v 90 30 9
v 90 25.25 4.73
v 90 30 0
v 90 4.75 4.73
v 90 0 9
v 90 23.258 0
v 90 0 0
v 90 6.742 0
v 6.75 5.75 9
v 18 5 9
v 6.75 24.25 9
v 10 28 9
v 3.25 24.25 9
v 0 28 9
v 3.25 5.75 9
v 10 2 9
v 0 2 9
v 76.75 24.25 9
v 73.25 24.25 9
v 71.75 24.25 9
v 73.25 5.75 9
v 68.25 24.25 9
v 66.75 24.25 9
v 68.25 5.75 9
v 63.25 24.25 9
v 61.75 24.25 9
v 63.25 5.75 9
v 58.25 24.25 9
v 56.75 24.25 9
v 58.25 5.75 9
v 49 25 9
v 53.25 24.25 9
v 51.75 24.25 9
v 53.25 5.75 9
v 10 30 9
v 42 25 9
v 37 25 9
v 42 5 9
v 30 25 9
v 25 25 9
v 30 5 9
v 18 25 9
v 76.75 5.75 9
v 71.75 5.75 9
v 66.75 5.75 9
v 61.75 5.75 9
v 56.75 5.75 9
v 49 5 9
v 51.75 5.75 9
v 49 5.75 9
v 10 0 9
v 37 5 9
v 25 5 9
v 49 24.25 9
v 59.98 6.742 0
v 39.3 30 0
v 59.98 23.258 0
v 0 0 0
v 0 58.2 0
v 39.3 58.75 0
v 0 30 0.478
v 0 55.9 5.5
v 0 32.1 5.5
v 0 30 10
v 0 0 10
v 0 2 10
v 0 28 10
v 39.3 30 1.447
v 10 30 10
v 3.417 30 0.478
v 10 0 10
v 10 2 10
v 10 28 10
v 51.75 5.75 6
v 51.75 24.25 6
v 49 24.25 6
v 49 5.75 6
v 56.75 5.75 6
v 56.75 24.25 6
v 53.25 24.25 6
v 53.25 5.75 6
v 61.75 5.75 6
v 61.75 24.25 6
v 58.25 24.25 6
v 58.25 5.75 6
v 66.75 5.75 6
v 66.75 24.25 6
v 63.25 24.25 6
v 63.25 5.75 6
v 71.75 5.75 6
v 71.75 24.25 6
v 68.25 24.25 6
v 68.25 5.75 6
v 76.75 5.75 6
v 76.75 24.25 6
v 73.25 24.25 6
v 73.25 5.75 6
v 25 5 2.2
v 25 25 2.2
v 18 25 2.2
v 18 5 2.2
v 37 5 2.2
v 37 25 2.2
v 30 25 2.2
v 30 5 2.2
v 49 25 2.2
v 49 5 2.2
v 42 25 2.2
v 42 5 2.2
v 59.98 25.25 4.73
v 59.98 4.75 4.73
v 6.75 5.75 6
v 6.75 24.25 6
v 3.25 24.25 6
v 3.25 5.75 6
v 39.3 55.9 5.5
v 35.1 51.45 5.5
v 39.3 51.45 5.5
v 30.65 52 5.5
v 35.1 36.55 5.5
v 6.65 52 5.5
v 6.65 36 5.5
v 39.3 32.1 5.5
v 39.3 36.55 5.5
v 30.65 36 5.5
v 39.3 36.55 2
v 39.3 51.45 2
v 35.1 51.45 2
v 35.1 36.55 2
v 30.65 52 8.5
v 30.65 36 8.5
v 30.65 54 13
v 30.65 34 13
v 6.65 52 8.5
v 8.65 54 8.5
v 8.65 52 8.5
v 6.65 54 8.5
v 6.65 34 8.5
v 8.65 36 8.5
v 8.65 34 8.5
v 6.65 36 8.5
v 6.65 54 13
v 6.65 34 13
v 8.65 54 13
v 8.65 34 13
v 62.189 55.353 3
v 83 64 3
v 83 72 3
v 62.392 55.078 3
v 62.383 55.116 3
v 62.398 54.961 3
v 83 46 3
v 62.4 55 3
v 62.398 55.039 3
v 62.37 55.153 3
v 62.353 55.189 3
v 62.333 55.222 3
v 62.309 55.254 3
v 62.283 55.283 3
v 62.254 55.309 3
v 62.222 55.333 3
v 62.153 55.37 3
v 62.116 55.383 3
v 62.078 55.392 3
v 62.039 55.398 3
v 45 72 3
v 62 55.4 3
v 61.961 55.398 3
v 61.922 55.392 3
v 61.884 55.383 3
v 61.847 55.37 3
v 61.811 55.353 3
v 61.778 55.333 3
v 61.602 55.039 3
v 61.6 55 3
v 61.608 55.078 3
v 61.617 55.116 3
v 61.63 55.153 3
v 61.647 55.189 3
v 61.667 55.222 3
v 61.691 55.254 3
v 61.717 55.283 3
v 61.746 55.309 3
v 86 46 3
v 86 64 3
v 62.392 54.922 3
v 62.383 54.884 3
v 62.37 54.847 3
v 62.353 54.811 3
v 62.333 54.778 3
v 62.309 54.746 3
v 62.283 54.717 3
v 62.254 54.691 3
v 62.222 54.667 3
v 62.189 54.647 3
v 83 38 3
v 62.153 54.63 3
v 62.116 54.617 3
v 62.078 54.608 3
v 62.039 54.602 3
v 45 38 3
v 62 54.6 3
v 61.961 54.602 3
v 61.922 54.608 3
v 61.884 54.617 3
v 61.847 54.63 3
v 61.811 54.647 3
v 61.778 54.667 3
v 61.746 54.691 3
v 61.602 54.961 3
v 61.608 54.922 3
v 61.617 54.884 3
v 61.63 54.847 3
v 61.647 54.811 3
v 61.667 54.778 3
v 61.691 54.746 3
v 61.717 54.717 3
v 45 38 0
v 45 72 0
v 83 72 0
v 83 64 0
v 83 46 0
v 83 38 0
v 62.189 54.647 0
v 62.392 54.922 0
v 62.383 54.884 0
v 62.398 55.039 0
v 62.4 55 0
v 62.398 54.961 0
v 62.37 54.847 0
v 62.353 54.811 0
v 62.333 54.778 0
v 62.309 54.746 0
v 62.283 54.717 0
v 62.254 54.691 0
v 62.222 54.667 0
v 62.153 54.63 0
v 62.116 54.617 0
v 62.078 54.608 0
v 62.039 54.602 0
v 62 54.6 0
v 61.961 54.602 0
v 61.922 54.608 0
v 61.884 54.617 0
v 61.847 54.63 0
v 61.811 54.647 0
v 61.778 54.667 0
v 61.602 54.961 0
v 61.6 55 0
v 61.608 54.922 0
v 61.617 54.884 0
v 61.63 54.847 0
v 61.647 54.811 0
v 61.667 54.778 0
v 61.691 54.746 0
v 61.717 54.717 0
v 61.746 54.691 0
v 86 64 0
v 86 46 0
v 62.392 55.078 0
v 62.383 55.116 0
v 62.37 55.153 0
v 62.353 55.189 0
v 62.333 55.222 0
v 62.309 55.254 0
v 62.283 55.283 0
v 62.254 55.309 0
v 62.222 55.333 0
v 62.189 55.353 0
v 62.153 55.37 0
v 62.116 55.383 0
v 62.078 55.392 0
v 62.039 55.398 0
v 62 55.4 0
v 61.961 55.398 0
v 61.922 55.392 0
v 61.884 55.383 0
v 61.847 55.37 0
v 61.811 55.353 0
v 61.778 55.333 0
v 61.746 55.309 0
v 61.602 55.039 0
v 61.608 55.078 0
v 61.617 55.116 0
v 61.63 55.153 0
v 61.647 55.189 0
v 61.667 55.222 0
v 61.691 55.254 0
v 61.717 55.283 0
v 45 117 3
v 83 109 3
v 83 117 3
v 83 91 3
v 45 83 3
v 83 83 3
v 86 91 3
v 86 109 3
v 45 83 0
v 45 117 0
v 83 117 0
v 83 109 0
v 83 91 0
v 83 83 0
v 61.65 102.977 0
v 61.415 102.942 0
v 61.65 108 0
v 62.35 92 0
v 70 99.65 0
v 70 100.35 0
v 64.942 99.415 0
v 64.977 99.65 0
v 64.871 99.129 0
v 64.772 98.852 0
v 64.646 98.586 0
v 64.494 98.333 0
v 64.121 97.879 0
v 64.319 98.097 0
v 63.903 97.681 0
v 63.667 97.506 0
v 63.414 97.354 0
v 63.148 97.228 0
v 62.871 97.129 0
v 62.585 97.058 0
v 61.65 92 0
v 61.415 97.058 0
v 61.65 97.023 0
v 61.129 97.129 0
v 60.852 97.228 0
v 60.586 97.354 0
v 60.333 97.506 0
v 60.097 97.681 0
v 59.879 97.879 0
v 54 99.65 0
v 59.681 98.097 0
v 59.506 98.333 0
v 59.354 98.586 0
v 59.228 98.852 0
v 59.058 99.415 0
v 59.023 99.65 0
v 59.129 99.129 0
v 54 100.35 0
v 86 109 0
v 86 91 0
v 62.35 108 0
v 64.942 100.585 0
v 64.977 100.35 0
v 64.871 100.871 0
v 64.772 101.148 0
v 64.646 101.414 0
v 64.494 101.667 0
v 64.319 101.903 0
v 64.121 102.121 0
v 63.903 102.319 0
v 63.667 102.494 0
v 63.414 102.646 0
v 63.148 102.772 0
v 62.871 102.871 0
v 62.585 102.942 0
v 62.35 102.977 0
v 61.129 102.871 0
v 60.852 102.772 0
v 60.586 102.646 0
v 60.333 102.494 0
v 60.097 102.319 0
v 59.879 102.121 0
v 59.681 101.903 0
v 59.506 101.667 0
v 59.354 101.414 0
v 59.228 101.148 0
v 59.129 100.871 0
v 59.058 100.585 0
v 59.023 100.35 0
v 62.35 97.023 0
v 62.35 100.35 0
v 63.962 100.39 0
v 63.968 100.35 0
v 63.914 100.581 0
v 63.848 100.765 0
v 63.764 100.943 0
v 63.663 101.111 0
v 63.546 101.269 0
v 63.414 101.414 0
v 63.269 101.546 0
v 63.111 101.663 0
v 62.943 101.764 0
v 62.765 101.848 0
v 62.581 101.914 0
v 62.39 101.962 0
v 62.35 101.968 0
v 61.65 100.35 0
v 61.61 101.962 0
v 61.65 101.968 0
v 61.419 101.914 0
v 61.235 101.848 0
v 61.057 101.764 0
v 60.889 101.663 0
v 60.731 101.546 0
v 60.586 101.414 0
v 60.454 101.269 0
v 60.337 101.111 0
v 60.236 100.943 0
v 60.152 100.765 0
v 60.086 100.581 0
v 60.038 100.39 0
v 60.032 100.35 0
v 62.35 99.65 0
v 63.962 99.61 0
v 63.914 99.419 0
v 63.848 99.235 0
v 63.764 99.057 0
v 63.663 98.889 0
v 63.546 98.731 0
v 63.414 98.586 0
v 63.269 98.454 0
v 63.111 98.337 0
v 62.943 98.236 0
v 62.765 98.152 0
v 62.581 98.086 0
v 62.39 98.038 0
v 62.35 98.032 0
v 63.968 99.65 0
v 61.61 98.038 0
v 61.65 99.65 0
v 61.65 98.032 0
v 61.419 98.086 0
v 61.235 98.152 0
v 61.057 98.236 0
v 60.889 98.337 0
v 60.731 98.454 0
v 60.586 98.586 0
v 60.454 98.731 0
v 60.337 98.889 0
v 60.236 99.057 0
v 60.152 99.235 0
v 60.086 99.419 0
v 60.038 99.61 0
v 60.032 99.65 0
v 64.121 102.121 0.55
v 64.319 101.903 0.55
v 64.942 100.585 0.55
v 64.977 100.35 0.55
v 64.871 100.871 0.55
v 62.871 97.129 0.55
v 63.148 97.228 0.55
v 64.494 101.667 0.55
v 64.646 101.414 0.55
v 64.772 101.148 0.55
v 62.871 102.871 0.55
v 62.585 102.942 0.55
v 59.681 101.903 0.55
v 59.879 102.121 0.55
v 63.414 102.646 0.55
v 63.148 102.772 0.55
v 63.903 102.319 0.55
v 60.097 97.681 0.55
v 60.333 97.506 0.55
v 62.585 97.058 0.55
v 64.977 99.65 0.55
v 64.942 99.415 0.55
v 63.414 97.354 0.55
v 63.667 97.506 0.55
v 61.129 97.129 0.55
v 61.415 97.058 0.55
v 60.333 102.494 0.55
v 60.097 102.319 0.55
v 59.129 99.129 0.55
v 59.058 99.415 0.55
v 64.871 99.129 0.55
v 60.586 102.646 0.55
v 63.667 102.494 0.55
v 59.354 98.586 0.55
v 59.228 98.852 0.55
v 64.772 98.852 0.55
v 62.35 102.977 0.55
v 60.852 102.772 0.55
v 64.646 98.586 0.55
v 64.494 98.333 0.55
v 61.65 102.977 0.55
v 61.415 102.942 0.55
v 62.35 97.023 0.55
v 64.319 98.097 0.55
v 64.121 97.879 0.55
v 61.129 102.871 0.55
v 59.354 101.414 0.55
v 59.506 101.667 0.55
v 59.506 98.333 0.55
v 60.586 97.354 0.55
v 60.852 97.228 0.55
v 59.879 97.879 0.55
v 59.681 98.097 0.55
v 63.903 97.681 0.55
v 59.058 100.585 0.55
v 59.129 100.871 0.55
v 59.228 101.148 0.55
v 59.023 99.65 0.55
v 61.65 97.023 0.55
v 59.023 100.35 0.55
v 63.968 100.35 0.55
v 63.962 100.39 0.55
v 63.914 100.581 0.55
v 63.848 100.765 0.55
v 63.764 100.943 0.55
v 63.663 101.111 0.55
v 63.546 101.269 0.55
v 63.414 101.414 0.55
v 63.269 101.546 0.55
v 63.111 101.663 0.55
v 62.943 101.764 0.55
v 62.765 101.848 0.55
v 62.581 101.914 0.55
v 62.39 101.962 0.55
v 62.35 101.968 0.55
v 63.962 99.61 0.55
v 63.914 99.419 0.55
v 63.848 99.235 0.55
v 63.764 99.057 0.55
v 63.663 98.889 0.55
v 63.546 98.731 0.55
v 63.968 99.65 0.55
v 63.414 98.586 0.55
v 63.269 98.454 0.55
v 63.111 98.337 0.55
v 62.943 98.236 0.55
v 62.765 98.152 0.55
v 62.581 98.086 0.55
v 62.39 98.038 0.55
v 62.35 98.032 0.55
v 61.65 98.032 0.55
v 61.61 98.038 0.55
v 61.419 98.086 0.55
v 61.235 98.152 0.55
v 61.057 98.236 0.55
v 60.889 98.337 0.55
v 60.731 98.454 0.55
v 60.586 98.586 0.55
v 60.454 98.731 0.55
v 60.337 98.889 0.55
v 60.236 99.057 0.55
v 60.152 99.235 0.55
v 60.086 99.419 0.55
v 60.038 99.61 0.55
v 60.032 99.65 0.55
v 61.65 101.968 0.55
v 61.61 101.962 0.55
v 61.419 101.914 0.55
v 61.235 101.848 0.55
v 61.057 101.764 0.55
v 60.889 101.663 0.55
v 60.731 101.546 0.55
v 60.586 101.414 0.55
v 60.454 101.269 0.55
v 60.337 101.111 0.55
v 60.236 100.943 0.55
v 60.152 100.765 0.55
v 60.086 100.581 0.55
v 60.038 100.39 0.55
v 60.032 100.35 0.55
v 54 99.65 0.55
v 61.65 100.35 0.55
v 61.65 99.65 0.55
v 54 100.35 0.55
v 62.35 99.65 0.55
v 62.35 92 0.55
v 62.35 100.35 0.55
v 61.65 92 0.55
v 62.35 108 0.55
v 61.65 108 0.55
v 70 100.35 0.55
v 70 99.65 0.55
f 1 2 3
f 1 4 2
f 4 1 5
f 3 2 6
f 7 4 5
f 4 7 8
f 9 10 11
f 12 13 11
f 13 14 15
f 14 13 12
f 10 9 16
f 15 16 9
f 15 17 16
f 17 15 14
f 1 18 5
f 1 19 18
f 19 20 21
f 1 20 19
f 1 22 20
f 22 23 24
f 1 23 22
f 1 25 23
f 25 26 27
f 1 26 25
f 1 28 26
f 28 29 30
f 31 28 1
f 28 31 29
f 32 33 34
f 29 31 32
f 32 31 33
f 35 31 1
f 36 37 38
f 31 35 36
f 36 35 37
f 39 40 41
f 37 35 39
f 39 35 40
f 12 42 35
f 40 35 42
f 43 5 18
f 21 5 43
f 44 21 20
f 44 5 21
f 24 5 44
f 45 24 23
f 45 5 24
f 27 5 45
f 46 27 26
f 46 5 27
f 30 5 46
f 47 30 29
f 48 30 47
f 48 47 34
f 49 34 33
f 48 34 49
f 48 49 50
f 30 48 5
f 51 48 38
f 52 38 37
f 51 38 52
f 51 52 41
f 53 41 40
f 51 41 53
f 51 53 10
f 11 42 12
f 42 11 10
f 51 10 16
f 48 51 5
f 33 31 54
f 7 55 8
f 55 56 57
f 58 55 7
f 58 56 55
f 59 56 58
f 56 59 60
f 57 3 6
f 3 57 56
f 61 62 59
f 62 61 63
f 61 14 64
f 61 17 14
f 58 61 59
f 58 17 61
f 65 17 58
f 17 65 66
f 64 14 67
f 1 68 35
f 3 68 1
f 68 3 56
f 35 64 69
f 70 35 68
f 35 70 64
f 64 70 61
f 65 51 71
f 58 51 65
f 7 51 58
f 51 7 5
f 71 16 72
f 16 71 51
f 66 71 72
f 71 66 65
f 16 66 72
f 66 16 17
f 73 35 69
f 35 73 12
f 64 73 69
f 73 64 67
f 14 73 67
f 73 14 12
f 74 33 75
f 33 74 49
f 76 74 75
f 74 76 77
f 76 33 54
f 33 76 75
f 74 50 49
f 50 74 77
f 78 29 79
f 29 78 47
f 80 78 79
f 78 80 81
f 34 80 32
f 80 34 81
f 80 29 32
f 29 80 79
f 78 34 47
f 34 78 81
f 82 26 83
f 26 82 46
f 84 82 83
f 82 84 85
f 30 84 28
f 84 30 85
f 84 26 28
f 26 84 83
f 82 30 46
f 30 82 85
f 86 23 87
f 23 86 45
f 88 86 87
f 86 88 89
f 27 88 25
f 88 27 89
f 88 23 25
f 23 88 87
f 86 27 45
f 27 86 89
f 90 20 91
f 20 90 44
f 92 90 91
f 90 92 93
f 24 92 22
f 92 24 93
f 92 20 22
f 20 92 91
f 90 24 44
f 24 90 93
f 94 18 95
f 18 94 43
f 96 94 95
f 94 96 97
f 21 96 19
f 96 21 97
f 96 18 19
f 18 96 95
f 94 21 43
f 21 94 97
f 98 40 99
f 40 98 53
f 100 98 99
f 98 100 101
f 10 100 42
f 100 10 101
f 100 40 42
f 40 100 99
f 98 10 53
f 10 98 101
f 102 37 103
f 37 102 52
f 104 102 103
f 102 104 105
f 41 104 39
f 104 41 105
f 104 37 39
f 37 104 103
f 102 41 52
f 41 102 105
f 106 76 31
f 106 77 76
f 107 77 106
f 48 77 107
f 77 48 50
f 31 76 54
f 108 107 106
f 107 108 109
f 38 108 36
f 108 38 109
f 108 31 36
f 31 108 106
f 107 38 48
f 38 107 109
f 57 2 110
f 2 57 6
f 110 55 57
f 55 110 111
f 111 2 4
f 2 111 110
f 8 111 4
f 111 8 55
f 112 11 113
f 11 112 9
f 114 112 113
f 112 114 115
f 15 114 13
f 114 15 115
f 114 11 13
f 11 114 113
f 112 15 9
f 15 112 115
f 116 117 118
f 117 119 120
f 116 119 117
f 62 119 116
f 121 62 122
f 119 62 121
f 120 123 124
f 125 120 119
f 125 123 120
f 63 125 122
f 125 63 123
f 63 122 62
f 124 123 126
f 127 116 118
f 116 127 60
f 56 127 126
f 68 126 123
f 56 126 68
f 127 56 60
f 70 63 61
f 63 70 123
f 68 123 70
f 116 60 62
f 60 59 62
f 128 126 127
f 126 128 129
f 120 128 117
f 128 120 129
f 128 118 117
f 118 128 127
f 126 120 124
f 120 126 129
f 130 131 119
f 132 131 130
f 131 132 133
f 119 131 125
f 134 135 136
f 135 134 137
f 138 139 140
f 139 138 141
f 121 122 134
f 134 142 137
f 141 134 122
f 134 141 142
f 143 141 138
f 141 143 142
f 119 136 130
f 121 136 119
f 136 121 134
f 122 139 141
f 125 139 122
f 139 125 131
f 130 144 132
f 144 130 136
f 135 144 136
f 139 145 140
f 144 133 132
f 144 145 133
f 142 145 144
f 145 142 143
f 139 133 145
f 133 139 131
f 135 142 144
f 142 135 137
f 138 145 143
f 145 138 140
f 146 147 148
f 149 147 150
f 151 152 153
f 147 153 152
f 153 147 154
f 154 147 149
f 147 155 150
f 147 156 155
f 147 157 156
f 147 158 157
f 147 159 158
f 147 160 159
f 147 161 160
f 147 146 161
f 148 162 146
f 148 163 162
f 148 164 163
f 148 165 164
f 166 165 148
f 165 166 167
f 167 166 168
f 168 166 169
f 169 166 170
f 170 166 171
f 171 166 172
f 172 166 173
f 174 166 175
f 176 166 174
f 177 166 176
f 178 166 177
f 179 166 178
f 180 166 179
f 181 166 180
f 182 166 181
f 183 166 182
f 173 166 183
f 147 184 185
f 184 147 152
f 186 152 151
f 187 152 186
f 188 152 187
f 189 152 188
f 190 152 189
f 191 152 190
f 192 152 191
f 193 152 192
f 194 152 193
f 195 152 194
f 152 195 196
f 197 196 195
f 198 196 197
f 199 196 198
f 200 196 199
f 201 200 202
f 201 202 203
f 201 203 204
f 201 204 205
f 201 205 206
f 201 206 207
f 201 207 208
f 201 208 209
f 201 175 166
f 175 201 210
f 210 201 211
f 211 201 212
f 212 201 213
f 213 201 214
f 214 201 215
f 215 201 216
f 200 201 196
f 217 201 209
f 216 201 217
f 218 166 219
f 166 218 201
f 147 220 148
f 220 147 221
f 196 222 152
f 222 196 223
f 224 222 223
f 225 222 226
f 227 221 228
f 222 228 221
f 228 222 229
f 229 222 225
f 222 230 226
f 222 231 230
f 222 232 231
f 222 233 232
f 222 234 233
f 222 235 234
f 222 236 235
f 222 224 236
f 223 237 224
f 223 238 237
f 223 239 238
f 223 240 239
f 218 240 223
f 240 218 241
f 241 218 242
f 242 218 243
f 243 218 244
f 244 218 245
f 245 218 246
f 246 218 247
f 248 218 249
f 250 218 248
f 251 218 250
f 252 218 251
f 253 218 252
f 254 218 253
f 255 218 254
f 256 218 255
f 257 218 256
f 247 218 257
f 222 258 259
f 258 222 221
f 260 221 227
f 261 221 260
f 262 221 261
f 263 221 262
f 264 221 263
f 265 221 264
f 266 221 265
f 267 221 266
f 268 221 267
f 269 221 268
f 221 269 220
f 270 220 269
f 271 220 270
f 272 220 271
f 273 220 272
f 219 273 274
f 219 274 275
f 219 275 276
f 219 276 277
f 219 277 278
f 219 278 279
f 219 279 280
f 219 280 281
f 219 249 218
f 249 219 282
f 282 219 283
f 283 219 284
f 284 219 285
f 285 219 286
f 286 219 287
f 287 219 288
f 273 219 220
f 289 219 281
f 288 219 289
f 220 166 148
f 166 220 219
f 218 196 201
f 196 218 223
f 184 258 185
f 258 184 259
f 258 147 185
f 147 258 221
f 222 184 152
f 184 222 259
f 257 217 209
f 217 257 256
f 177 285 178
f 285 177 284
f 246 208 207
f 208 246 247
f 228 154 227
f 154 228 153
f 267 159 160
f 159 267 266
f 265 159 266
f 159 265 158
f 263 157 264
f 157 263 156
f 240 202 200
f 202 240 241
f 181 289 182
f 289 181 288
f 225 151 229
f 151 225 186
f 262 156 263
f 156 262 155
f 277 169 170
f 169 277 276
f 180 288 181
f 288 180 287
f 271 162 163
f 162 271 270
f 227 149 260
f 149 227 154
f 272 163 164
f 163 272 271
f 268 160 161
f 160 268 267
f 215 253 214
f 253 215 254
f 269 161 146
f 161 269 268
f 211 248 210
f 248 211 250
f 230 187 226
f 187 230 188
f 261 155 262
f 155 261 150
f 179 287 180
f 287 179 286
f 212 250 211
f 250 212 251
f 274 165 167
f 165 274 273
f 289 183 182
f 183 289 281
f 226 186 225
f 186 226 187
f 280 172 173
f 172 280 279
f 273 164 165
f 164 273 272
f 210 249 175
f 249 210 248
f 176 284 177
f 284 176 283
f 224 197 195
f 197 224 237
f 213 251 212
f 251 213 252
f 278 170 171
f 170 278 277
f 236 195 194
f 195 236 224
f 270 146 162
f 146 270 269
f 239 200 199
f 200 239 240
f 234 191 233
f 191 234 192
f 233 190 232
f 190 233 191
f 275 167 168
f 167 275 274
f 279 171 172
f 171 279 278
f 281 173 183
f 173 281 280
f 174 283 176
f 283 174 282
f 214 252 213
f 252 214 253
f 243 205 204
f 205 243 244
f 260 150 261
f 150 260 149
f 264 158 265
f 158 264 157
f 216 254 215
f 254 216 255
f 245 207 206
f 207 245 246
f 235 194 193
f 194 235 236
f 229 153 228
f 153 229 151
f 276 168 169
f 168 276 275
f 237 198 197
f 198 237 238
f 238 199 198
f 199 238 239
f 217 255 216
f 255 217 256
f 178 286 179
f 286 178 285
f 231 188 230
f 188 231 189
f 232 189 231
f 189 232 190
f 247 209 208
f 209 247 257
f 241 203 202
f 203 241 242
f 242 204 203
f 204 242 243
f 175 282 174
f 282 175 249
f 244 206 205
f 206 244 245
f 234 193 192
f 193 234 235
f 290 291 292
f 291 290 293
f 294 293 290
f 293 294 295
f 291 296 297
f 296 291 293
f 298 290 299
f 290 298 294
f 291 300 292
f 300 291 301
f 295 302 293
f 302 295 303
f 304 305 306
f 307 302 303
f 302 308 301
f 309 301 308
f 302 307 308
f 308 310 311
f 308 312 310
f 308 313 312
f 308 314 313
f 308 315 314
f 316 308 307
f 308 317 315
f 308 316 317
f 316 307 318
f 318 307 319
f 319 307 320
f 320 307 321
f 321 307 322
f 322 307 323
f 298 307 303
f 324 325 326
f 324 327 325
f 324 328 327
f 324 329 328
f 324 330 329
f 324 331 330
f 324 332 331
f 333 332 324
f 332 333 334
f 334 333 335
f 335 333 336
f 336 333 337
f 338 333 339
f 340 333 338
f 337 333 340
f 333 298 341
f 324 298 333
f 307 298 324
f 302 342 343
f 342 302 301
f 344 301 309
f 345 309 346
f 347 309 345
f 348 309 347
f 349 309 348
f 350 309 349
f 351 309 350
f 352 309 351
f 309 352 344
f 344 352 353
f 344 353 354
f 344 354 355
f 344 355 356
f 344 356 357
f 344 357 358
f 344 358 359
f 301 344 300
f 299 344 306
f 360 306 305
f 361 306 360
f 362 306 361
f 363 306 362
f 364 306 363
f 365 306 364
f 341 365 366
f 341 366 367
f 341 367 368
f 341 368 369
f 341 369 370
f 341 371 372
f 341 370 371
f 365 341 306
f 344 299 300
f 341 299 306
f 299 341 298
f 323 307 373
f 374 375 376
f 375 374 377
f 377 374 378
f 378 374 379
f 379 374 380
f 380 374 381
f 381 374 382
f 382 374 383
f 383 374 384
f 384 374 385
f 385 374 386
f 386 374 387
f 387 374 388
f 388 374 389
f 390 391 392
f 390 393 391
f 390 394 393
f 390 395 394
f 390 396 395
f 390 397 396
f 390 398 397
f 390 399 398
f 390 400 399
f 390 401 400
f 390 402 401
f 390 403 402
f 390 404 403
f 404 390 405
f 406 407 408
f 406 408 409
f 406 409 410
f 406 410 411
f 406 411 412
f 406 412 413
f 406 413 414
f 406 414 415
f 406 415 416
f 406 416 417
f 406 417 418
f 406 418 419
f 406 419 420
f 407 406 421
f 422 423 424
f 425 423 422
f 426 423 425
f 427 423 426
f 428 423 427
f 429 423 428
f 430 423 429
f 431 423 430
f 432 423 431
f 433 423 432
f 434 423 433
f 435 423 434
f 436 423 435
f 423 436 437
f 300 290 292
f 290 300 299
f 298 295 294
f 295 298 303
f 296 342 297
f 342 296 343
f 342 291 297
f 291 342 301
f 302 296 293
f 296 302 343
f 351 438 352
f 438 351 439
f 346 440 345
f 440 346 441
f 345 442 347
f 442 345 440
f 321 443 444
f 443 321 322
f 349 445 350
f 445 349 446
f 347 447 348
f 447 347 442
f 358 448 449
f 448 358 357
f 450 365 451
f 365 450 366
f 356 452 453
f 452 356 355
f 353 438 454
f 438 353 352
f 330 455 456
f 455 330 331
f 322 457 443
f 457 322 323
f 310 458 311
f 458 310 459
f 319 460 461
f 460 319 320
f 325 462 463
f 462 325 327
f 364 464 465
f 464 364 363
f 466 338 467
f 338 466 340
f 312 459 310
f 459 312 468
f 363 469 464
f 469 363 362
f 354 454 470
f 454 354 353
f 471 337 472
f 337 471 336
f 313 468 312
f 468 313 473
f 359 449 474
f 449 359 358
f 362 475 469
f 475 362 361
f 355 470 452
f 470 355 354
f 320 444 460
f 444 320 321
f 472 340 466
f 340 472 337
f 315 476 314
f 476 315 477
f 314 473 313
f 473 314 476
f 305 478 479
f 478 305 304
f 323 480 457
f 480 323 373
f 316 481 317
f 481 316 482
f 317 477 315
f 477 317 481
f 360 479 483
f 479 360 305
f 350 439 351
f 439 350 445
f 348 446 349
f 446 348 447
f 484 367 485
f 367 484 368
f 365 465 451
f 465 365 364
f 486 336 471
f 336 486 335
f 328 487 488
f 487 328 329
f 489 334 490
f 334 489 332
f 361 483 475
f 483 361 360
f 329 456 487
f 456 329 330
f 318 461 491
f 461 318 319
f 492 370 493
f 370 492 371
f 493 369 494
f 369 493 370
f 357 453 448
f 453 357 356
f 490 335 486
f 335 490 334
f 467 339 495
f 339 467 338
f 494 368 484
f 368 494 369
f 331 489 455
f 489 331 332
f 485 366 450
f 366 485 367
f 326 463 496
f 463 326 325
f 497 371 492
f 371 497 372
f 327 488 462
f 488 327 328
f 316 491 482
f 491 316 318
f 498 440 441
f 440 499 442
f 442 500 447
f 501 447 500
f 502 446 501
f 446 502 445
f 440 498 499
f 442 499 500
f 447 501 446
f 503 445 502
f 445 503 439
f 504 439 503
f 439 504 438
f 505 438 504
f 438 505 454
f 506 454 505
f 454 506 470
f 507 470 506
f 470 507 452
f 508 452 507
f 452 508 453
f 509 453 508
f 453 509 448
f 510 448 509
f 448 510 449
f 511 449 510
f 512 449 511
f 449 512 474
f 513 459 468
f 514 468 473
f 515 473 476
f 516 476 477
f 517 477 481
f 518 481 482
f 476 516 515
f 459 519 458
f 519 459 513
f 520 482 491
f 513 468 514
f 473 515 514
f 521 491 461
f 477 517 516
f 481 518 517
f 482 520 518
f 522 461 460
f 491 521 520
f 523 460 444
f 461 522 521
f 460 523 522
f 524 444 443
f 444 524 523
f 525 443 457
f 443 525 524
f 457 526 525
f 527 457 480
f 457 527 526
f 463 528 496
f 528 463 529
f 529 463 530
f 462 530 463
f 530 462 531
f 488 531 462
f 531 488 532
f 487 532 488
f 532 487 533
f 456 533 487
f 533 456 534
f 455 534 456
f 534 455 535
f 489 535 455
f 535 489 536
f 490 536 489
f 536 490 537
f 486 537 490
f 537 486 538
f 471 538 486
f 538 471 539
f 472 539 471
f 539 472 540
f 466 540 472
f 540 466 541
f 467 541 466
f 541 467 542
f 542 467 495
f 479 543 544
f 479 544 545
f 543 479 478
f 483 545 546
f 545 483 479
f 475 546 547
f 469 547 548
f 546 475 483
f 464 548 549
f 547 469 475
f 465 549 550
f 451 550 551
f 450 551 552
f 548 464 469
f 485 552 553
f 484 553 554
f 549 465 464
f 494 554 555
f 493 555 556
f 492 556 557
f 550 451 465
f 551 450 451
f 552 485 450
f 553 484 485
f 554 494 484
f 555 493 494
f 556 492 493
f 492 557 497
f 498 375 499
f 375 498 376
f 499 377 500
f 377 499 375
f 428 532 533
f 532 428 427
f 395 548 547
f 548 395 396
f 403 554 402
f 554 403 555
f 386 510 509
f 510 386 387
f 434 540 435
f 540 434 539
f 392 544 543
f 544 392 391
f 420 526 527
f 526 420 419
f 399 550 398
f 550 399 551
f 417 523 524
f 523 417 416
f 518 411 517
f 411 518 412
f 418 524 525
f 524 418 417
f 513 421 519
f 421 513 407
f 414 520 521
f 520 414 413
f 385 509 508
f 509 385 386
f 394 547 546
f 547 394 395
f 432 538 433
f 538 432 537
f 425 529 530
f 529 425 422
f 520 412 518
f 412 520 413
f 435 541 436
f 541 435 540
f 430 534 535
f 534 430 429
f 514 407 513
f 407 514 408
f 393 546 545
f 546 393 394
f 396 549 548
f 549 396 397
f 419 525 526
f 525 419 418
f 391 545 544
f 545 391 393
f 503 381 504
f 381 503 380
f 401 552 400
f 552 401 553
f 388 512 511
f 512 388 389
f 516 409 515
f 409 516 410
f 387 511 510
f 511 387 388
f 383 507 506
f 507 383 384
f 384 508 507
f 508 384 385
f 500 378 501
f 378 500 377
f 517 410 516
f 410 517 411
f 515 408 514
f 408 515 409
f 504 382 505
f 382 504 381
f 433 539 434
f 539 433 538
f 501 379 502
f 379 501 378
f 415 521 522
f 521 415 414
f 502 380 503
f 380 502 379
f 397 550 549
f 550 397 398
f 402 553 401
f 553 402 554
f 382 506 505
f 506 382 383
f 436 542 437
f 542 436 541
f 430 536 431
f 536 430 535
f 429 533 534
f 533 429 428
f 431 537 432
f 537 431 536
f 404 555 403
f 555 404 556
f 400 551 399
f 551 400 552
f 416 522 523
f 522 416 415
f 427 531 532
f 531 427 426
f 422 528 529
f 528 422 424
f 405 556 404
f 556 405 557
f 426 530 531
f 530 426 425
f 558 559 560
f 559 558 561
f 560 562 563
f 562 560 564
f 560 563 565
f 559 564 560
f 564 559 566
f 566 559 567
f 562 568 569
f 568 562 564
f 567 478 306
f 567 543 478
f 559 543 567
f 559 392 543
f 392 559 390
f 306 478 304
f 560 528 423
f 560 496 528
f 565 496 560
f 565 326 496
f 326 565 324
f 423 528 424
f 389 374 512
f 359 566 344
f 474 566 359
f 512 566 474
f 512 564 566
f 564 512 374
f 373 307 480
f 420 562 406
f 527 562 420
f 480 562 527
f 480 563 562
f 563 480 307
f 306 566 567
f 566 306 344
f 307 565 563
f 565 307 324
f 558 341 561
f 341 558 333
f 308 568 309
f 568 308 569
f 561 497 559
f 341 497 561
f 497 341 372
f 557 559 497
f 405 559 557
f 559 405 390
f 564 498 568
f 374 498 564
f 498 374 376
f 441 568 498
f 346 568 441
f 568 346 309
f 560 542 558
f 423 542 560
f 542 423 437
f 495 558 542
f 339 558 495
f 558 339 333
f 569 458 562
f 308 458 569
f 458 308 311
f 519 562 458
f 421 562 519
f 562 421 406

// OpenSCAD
/*
  OAJ Solar Finder System — Prototype P1

  Projection finder for solar alignment. It does not contain a lens and must
  never be looked through. A certified full-aperture solar filter is still
  required on the telescope.

  Export with, for example:
    openscad -o stl/OAJ_SFS_P1_body.stl -D 'part="body"' openscad/solar_finder.scad
*/

$fn = 64;

// Select: layout, body, nacatin_adapter, pinhole_plate, target_plate, assembly.
part = "layout";

// Printer/service tuning. This is radial/per-side clearance, not total gap.
fit_clearance = 0.25;

// Universal body and adapter interface. Keep these values unchanged when
// adding telescope-specific adapters.
body_length = 90;
body_width = 30;
body_height = 9;
socket_start = 60;
adapter_tongue_length = 22;
adapter_tongue_neck_width = 16;
adapter_tongue_head_width = 20;
adapter_tongue_height = 4.5;
adapter_stop_thickness = 2;

// Projection plates.
plate_width = 34;
plate_height = 38;
plate_thickness = 3;
plate_tab_width = 18;
plate_tab_depth = 3;
plate_slot_length = plate_thickness + (2 * fit_clearance);
plate_slot_width = plate_tab_width + (2 * fit_clearance);
front_slot_x = 5;
target_distances = [45, 50, 55, 60, 65, 70];
pinhole_diameter = 0.8; // Printed pilot; finish carefully with a 0.8 mm drill.
optical_height = 21;

// Nacatin 90/800 finder-foot measurements. The height was estimated from
// photographs and is the main fit item to verify on P1.
nacatin_foot_length = 39.3;
nacatin_foot_top_width = 23.8;
nacatin_foot_bottom_width_front = 28.4;
nacatin_foot_bottom_width_rear = 29.5;
nacatin_foot_height = 5.5;
nacatin_notch_width = 14.9;
nacatin_notch_length = 4.2;
nacatin_notch_depth = 3.5;

eps = 0.02;

module dovetail_prism(length, neck_width, head_width, height) {
    // Extrude a captured dovetail along +X.
    rotate([0, 90, 0])
        linear_extrude(height = length)
            polygon([
                [0, -neck_width / 2],
                [-height, -head_width / 2],
                [-height,  head_width / 2],
                [0,  neck_width / 2]
            ]);
}

module plate_blank() {
    // Plate plane is Y/Z; thickness is X. Tab locates in a body slot.
    union() {
        translate([-plate_thickness / 2, -plate_width / 2, 0])
            cube([plate_thickness, plate_width, plate_height]);
        translate([-plate_thickness / 2, -plate_tab_width / 2, -plate_tab_depth])
            cube([plate_thickness, plate_tab_width, plate_tab_depth + eps]);
    }
}

module finder_body() {
    difference() {
        union() {
            cube([body_length, body_width, body_height]);
            // End shoulders protect the plate tab and identify the front.
            cube([10, 2, body_height + 1]);
            translate([0, body_width - 2, 0]) cube([10, 2, body_height + 1]);
        }

        // Captured female dovetail, open at the rear for adapter insertion.
        translate([socket_start - eps, body_width / 2, -eps])
            dovetail_prism(
                body_length - socket_start + (2 * eps),
                adapter_tongue_neck_width + (2 * fit_clearance),
                adapter_tongue_head_width + (2 * fit_clearance),
                adapter_tongue_height + fit_clearance
            );

        // Fixed front-plate slot.
        translate([
            front_slot_x - plate_slot_length / 2,
            (body_width - plate_slot_width) / 2,
            body_height - plate_tab_depth
        ]) cube([plate_slot_length, plate_slot_width, plate_tab_depth + eps]);

        // Rear target positions, measured from the pinhole plane.
        for (distance = target_distances)
            translate([
                front_slot_x + distance - plate_slot_length / 2,
                (body_width - plate_slot_width) / 2,
                body_height - plate_tab_depth
            ]) cube([plate_slot_length, plate_slot_width, plate_tab_depth + eps]);

        // Weight-reduction pockets stay clear of all slots and the socket.
        for (x = [18, 30, 42])
            translate([x, 5, 2.2]) cube([7, body_width - 10, body_height]);
    }
}

module nacatin_foot() {
    // Tapered reproduction of the measured finder foot.
    difference() {
        polyhedron(
            points = [
                [0, -nacatin_foot_bottom_width_front / 2, 0],
                [0,  nacatin_foot_bottom_width_front / 2, 0],
                [nacatin_foot_length, -nacatin_foot_bottom_width_rear / 2, 0],
                [nacatin_foot_length,  nacatin_foot_bottom_width_rear / 2, 0],
                [0, -nacatin_foot_top_width / 2, nacatin_foot_height],
                [0,  nacatin_foot_top_width / 2, nacatin_foot_height],
                [nacatin_foot_length, -nacatin_foot_top_width / 2, nacatin_foot_height],
                [nacatin_foot_length,  nacatin_foot_top_width / 2, nacatin_foot_height]
            ],
            faces = [
                [0, 2, 3, 1], [4, 5, 7, 6],
                [0, 1, 5, 4], [2, 6, 7, 3],
                [0, 4, 6, 2], [1, 3, 7, 5]
            ],
            convexity = 10
        );

        // Measured rear locating notch.
        translate([
            nacatin_foot_length - nacatin_notch_length,
            -nacatin_notch_width / 2,
            nacatin_foot_height - nacatin_notch_depth
        ]) cube([
            nacatin_notch_length + eps,
            nacatin_notch_width,
            nacatin_notch_depth + eps
        ]);
    }
}

module nacatin_adapter() {
    pedestal_height = 3;
    tongue_x = (nacatin_foot_length - adapter_tongue_length) / 2;

    union() {
        nacatin_foot();
        translate([
            tongue_x - adapter_stop_thickness,
            -adapter_tongue_neck_width / 2,
            nacatin_foot_height
        ]) cube([
            adapter_tongue_length + adapter_stop_thickness,
            adapter_tongue_neck_width,
            pedestal_height
        ]);

        translate([tongue_x, 0, nacatin_foot_height + pedestal_height])
            dovetail_prism(
                adapter_tongue_length,
                adapter_tongue_neck_width,
                adapter_tongue_head_width,
                adapter_tongue_height
            );

        // Positive insertion stop at the front of the universal tongue.
        translate([
            tongue_x - adapter_stop_thickness,
            -adapter_tongue_head_width / 2,
            nacatin_foot_height + pedestal_height
        ]) cube([
            adapter_stop_thickness,
            adapter_tongue_head_width,
            adapter_tongue_height
        ]);
    }
}

module pinhole_plate_raw() {
    difference() {
        plate_blank();
        translate([0, 0, optical_height])
            rotate([0, 90, 0])
                cylinder(h = plate_thickness + 2, d = pinhole_diameter, center = true);
    }
}

module target_plate_raw() {
    groove_depth = 0.55;
    groove_width = 0.7;
    difference() {
        plate_blank();
        // Recessed crosshair on the Sun-facing side.
        translate([-plate_thickness / 2 - eps, -8, optical_height - groove_width / 2])
            cube([groove_depth + eps, 16, groove_width]);
        translate([-plate_thickness / 2 - eps, -groove_width / 2, optical_height - 8])
            cube([groove_depth + eps, groove_width, 16]);
        translate([-plate_thickness / 2 - eps, 0, optical_height])
            rotate([0, 90, 0])
                difference() {
                    cylinder(h = groove_depth + eps, d = 6);
                    translate([0, 0, -eps])
                        cylinder(h = groove_depth + (3 * eps), d = 4);
                }
    }
}

module pinhole_plate_print() {
    // Lay the broad face on the bed.
    translate([plate_height, 0, plate_thickness / 2])
        rotate([0, -90, 0]) pinhole_plate_raw();
}

module target_plate_print() {
    // Target face upwards so the shallow markings remain clean.
    translate([plate_height, 0, plate_thickness / 2])
        rotate([0, -90, 0]) target_plate_raw();
}

module assembled_preview(target_distance = 70) {
    color("DimGray") finder_body();
    color("Orange")
        translate([front_slot_x, body_width / 2, body_height]) pinhole_plate_raw();
    color("Ivory")
        translate([front_slot_x + target_distance, body_width / 2, body_height]) target_plate_raw();

    // Adapter shown inserted; it remains a separate printed component.
    adapter_tongue_local_x = (nacatin_foot_length - adapter_tongue_length) / 2;
    color("SteelBlue")
        translate([
            socket_start - adapter_tongue_local_x,
            body_width / 2,
            -(nacatin_foot_height + 3)
        ]) nacatin_adapter();
}

module print_layout() {
    finder_body();
    translate([0, 44, 0]) nacatin_adapter();
    translate([45, 55, 0]) pinhole_plate_print();
    translate([45, 100, 0]) target_plate_print();
}

if (part == "body") finder_body();
else if (part == "nacatin_adapter") nacatin_adapter();
else if (part == "pinhole_plate") pinhole_plate_print();
else if (part == "target_plate") target_plate_print();
else if (part == "assembly") assembled_preview();
else print_layout();
